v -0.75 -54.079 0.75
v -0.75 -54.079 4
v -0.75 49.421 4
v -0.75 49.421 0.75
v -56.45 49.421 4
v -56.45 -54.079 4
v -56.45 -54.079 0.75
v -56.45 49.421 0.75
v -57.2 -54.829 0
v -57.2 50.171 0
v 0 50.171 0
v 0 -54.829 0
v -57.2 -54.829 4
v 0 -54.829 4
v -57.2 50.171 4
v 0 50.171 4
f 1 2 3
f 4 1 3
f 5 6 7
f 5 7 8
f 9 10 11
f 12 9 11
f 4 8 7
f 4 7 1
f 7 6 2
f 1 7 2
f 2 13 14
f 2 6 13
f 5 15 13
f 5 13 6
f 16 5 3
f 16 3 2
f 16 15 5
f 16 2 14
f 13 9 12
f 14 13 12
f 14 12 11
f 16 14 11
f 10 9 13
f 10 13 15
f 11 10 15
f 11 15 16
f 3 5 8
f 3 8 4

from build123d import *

# Parameters (mm, degrees)
F0_W     = 57.2
F0_H     = 105
F1_DEPTH = 4
F2_W     = 55.7
F2_H     = 103.5
F3_DEPTH = 3.25


with BuildPart() as f1:
    # F0 (on Top) → F1 (new body)
    with BuildSketch(Plane.XY):
        with Locations((-28.6, -2.328537)):
            Rectangle(F0_W, F0_H)
    extrude(amount=F1_DEPTH)

    # F2 (on face) → F3 (cut)
    with BuildSketch(Plane.XY.offset(4)):
        with Locations((-28.6, -2.328537)):
            Rectangle(F2_W, F2_H)
    extrude(amount=-F3_DEPTH, mode=Mode.SUBTRACT)


solid = f1.part
